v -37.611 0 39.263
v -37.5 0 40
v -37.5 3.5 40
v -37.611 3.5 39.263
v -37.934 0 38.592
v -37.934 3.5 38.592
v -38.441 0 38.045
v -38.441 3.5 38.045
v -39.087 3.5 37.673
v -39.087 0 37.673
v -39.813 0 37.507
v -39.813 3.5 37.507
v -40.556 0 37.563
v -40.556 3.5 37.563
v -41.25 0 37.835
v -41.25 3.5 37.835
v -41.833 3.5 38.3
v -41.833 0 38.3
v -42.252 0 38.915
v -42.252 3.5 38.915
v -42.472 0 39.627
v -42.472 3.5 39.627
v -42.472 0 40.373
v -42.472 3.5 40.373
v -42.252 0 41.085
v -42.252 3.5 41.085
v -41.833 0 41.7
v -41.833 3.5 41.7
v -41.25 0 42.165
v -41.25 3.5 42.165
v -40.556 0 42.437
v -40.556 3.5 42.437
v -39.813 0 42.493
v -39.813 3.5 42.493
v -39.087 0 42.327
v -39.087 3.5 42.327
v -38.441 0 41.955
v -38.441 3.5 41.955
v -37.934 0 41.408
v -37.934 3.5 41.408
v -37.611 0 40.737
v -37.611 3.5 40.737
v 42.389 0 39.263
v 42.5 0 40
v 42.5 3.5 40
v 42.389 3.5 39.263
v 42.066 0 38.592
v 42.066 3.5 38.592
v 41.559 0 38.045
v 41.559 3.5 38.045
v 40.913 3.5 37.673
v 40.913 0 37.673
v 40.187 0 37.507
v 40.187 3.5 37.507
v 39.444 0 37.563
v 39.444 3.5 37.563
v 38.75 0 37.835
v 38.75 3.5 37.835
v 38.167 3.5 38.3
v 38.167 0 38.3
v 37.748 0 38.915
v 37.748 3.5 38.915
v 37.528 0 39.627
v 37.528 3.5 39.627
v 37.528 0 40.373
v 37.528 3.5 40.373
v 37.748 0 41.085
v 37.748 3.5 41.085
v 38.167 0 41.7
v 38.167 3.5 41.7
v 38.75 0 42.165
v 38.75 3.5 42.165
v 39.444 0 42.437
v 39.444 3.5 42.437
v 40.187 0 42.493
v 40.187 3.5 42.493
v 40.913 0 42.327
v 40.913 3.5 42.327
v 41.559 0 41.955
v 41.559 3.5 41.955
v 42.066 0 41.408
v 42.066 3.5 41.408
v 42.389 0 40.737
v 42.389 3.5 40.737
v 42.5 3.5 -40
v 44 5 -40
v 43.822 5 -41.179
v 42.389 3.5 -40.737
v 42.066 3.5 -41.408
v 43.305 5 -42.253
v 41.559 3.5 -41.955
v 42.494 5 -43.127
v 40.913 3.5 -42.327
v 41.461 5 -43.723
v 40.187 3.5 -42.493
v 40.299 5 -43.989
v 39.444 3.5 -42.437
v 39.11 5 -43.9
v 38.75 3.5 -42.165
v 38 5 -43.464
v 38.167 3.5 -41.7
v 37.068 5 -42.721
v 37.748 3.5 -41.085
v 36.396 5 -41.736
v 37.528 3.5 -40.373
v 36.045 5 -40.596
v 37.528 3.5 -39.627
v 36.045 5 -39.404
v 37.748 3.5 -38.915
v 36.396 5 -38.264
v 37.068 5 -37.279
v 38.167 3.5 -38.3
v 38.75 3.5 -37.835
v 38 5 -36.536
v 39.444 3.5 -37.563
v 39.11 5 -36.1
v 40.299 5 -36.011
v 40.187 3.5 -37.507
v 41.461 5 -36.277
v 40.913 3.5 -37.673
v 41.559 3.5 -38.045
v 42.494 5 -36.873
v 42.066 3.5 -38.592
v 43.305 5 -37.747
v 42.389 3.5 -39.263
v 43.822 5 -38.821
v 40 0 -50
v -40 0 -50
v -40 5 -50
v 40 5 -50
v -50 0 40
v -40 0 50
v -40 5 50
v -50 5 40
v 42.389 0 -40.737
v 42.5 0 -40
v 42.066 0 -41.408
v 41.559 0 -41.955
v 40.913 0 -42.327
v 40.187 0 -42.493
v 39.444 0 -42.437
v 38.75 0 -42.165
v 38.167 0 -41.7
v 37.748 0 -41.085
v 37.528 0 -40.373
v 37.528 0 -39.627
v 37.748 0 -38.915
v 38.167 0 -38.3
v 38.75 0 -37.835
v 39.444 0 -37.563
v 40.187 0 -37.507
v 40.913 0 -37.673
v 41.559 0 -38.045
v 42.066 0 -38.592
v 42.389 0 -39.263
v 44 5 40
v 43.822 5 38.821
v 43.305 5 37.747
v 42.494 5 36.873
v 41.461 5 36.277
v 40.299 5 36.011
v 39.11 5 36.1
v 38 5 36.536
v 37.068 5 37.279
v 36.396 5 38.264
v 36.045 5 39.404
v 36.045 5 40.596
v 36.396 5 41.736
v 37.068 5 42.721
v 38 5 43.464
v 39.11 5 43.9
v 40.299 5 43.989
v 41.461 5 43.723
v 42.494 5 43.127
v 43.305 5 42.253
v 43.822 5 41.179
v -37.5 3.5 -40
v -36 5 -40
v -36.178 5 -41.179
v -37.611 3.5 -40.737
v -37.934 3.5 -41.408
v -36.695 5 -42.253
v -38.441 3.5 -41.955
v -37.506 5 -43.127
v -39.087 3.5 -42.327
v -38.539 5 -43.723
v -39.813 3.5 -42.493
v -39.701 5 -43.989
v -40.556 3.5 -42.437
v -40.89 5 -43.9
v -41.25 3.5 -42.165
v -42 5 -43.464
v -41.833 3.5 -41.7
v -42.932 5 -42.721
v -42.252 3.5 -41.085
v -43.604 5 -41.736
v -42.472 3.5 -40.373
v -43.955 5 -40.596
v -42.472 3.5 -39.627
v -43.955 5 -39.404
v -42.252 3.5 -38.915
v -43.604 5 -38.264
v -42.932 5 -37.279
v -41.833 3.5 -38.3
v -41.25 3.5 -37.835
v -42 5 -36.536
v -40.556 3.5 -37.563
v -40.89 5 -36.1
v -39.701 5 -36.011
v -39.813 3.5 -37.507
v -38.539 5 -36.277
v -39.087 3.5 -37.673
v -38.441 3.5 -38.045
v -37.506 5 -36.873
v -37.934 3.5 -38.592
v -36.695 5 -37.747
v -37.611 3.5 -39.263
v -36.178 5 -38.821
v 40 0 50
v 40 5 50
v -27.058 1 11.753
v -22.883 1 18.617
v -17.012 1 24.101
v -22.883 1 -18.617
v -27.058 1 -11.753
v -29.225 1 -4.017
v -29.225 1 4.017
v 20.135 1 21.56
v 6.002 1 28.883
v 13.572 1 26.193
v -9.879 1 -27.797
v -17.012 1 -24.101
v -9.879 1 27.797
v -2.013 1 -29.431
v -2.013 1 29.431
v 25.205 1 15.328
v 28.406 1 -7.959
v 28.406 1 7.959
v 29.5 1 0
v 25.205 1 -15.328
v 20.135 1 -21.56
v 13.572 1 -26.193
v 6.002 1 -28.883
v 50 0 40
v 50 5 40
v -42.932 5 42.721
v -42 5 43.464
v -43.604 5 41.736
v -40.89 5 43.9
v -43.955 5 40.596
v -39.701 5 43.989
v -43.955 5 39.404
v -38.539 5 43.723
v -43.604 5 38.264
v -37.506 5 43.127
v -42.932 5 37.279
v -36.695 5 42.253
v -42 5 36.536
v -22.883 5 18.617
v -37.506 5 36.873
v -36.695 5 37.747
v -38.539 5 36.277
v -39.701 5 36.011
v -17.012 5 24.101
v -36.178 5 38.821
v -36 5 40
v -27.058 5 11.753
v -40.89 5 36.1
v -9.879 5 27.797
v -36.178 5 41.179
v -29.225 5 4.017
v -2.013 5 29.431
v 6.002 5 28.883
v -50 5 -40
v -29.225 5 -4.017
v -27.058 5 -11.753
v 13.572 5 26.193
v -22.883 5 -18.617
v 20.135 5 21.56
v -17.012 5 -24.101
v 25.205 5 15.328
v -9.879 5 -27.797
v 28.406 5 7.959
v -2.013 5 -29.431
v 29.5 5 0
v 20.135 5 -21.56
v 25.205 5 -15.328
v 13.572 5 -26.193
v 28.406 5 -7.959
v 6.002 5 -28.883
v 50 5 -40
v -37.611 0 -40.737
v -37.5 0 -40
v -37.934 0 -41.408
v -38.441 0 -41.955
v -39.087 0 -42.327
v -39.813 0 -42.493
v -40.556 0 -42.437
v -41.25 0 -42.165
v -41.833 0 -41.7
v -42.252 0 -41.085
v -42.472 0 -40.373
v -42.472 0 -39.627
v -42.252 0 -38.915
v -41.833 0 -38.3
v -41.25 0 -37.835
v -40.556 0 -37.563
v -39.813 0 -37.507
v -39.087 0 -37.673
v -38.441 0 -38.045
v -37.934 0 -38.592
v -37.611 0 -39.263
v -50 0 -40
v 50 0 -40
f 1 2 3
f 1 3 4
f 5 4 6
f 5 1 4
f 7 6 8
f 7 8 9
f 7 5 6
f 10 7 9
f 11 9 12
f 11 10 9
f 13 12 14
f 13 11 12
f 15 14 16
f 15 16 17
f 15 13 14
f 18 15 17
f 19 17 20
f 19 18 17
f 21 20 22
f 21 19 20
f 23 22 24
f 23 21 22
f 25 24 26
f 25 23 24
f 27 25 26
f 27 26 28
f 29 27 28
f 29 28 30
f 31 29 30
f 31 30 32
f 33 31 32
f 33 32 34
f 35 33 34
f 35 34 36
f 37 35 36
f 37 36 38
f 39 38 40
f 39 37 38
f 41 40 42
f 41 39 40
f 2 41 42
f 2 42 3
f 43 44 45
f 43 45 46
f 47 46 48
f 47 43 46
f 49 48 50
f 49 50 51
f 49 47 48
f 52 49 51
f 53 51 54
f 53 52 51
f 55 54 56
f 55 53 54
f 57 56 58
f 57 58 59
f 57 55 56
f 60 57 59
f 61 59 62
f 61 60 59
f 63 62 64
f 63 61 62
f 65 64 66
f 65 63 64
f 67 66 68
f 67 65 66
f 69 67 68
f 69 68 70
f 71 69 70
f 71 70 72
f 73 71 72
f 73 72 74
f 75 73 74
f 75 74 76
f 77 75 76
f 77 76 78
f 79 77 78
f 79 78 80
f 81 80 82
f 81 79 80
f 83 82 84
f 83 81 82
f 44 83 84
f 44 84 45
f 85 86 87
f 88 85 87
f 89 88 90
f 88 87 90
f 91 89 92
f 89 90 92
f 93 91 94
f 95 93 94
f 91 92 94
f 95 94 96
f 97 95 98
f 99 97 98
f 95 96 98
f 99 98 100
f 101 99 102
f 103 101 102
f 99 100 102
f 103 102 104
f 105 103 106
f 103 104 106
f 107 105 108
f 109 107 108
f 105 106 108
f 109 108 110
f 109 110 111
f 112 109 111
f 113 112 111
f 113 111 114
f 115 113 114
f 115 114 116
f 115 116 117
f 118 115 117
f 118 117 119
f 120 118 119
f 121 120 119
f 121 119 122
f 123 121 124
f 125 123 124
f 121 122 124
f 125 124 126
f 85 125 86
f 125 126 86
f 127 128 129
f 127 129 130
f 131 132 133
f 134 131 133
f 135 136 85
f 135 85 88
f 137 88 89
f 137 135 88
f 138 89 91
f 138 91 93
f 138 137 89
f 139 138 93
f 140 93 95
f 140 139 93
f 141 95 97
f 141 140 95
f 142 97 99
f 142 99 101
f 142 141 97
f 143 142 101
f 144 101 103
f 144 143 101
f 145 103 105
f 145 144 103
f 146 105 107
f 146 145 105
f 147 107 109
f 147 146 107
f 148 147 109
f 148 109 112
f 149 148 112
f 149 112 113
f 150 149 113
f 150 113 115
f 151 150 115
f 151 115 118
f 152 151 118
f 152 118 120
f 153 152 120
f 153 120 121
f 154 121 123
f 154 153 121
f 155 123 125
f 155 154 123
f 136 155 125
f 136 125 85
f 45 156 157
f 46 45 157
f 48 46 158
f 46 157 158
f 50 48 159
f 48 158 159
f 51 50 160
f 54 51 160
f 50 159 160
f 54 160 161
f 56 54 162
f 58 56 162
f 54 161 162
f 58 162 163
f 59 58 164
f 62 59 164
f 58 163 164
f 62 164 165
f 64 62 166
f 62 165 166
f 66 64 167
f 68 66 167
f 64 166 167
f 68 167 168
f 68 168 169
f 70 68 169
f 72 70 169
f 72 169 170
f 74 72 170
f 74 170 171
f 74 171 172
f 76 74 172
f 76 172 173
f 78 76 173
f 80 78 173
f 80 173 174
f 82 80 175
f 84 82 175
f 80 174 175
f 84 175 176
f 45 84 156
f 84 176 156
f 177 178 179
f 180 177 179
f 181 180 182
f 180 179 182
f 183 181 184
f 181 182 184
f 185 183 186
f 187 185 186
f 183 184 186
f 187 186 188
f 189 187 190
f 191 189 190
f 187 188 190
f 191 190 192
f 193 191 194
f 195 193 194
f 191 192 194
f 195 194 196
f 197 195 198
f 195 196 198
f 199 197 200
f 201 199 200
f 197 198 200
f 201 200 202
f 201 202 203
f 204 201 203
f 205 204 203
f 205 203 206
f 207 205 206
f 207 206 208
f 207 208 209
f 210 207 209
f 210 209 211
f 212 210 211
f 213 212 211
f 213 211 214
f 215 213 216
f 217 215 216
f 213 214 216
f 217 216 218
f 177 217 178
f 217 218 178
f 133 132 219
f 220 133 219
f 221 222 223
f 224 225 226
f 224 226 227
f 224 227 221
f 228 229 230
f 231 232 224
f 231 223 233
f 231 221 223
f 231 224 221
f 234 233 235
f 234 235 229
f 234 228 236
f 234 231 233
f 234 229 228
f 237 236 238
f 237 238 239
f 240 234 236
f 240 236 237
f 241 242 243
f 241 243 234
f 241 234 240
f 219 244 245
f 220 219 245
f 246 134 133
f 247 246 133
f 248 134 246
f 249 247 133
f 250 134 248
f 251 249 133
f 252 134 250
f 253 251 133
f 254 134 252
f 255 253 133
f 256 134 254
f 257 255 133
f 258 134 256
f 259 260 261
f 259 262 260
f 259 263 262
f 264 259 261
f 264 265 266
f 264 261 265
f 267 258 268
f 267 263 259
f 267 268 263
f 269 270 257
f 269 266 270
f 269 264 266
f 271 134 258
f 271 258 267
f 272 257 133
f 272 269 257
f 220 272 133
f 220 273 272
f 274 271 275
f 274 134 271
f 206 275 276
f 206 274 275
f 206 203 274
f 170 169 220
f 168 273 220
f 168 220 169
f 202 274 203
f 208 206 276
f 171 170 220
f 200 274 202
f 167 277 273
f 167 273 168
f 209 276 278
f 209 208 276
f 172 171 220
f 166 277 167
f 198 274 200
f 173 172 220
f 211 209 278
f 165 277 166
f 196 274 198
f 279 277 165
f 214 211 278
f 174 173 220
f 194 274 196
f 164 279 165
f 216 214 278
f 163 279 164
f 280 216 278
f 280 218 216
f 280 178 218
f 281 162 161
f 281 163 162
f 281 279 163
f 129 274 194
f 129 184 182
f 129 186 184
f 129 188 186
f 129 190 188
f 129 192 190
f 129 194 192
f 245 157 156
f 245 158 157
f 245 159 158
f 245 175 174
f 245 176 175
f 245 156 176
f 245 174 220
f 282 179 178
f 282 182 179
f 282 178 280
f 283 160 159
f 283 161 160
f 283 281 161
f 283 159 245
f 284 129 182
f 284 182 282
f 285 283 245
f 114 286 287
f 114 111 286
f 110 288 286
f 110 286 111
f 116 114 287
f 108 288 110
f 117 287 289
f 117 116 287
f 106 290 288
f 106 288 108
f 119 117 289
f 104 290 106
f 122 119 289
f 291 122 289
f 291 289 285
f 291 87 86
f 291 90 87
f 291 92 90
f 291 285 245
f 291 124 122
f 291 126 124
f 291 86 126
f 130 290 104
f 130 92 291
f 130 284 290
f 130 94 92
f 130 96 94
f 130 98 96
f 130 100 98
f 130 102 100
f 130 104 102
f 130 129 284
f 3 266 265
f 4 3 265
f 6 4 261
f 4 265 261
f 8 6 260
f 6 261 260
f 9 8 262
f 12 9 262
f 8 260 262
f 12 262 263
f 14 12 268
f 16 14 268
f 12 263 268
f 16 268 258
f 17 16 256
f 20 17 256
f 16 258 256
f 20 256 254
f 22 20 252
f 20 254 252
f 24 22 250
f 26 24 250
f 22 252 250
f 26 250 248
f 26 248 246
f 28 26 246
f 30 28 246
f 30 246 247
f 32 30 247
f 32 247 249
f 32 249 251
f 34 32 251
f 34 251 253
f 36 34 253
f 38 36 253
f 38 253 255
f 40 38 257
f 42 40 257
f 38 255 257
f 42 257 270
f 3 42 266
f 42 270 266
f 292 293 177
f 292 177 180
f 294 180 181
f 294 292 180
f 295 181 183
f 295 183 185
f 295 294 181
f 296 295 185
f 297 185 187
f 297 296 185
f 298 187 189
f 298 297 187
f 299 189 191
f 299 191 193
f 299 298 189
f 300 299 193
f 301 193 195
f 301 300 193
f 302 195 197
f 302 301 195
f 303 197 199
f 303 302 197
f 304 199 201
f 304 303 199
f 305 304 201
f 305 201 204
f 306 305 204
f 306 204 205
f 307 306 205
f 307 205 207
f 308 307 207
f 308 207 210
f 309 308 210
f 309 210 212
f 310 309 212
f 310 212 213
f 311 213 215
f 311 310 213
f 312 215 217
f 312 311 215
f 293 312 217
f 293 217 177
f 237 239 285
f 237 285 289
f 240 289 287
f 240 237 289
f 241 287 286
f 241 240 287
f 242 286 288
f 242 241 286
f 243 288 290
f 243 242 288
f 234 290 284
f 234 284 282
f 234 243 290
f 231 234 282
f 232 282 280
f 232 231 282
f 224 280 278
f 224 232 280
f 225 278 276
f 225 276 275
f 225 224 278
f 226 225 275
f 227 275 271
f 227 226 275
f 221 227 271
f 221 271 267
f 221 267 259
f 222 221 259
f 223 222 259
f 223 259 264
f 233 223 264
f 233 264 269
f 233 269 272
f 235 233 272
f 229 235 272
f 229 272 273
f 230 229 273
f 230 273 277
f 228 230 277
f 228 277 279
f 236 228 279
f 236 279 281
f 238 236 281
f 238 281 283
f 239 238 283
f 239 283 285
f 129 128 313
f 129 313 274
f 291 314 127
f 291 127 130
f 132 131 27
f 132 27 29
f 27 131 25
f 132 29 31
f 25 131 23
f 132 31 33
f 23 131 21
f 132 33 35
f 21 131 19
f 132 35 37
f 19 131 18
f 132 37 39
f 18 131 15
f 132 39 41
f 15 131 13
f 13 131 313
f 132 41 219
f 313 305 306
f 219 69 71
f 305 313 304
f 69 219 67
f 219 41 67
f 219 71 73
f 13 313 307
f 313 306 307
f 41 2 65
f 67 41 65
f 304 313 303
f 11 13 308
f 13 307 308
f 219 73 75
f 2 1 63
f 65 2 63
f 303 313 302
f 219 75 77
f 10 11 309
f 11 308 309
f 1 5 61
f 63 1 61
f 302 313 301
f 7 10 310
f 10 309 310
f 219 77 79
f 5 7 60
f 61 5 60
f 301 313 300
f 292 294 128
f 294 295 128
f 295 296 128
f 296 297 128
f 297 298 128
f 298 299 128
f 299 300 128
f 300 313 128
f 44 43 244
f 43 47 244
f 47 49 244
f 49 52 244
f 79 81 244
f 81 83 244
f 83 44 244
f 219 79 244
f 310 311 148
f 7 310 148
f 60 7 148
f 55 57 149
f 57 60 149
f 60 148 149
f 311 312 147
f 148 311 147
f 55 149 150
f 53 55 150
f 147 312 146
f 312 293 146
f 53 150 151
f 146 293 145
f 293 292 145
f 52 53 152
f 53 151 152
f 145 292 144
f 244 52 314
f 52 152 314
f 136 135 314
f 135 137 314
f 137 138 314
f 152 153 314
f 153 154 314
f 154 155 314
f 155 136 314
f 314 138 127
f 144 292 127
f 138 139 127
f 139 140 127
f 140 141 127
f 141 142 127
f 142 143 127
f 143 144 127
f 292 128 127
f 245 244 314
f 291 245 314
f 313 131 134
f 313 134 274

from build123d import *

# Parameters (mm, degrees)
SKETCH1_W           = 100
SKETCH1_H           = 100
SKETCH1_R           = 2.5
SKETCH1_R_2         = 29.5
BOSS_EXTRUDE1_DEPTH = 5
SKETCH1_3_R         = 29.5
BOSS_EXTRUDE2_DEPTH = 1
CHAMFER1_SIZE       = 10
CHAMFER3_SIZE       = 1.5


with BuildPart() as part:
    # Sketch1 → Boss-Extrude1 (new body)
    with BuildSketch(Plane(origin=(0, 0, 0), x_dir=(1, 0, 0), z_dir=(0, 1, 0))):
        Rectangle(SKETCH1_W, SKETCH1_H)
        with Locations((40, -40)):
            Circle(SKETCH1_R, mode=Mode.SUBTRACT)
        with Locations((-40, 40)):
            Circle(SKETCH1_R, mode=Mode.SUBTRACT)
        Circle(SKETCH1_R_2, mode=Mode.SUBTRACT)
        with Locations((40, 40)):
            Circle(SKETCH1_R, mode=Mode.SUBTRACT)
        with Locations((-40, -40)):
            Circle(SKETCH1_R, mode=Mode.SUBTRACT)
    extrude(amount=BOSS_EXTRUDE1_DEPTH)

    # Sketch1<3> → Boss-Extrude2 (add)
    with BuildSketch(Plane(origin=(0, 0, 0), x_dir=(1, 0, 0), z_dir=(0, 1, 0))):
        Circle(SKETCH1_3_R)
    extrude(amount=BOSS_EXTRUDE2_DEPTH)

    # Chamfer1
    chamfer1_edges = [part.edges().sort_by_distance(p)[0] for p in [
        (-50, 2.5, 50),
        (-50, 2.5, -50),
        (50, 2.5, -50),
        (50, 2.5, 50),
    ]]
    chamfer(chamfer1_edges, length=CHAMFER1_SIZE)

    # Chamfer3
    chamfer3_edges = [part.edges().sort_by_distance(p)[0] for p in [
        (37.5, 5, 40),
        (-42.5, 5, -40),
        (37.5, 5, -40),
        (-42.5, 5, 40),
    ]]
    chamfer(chamfer3_edges, length=CHAMFER3_SIZE)


solid = part.part
